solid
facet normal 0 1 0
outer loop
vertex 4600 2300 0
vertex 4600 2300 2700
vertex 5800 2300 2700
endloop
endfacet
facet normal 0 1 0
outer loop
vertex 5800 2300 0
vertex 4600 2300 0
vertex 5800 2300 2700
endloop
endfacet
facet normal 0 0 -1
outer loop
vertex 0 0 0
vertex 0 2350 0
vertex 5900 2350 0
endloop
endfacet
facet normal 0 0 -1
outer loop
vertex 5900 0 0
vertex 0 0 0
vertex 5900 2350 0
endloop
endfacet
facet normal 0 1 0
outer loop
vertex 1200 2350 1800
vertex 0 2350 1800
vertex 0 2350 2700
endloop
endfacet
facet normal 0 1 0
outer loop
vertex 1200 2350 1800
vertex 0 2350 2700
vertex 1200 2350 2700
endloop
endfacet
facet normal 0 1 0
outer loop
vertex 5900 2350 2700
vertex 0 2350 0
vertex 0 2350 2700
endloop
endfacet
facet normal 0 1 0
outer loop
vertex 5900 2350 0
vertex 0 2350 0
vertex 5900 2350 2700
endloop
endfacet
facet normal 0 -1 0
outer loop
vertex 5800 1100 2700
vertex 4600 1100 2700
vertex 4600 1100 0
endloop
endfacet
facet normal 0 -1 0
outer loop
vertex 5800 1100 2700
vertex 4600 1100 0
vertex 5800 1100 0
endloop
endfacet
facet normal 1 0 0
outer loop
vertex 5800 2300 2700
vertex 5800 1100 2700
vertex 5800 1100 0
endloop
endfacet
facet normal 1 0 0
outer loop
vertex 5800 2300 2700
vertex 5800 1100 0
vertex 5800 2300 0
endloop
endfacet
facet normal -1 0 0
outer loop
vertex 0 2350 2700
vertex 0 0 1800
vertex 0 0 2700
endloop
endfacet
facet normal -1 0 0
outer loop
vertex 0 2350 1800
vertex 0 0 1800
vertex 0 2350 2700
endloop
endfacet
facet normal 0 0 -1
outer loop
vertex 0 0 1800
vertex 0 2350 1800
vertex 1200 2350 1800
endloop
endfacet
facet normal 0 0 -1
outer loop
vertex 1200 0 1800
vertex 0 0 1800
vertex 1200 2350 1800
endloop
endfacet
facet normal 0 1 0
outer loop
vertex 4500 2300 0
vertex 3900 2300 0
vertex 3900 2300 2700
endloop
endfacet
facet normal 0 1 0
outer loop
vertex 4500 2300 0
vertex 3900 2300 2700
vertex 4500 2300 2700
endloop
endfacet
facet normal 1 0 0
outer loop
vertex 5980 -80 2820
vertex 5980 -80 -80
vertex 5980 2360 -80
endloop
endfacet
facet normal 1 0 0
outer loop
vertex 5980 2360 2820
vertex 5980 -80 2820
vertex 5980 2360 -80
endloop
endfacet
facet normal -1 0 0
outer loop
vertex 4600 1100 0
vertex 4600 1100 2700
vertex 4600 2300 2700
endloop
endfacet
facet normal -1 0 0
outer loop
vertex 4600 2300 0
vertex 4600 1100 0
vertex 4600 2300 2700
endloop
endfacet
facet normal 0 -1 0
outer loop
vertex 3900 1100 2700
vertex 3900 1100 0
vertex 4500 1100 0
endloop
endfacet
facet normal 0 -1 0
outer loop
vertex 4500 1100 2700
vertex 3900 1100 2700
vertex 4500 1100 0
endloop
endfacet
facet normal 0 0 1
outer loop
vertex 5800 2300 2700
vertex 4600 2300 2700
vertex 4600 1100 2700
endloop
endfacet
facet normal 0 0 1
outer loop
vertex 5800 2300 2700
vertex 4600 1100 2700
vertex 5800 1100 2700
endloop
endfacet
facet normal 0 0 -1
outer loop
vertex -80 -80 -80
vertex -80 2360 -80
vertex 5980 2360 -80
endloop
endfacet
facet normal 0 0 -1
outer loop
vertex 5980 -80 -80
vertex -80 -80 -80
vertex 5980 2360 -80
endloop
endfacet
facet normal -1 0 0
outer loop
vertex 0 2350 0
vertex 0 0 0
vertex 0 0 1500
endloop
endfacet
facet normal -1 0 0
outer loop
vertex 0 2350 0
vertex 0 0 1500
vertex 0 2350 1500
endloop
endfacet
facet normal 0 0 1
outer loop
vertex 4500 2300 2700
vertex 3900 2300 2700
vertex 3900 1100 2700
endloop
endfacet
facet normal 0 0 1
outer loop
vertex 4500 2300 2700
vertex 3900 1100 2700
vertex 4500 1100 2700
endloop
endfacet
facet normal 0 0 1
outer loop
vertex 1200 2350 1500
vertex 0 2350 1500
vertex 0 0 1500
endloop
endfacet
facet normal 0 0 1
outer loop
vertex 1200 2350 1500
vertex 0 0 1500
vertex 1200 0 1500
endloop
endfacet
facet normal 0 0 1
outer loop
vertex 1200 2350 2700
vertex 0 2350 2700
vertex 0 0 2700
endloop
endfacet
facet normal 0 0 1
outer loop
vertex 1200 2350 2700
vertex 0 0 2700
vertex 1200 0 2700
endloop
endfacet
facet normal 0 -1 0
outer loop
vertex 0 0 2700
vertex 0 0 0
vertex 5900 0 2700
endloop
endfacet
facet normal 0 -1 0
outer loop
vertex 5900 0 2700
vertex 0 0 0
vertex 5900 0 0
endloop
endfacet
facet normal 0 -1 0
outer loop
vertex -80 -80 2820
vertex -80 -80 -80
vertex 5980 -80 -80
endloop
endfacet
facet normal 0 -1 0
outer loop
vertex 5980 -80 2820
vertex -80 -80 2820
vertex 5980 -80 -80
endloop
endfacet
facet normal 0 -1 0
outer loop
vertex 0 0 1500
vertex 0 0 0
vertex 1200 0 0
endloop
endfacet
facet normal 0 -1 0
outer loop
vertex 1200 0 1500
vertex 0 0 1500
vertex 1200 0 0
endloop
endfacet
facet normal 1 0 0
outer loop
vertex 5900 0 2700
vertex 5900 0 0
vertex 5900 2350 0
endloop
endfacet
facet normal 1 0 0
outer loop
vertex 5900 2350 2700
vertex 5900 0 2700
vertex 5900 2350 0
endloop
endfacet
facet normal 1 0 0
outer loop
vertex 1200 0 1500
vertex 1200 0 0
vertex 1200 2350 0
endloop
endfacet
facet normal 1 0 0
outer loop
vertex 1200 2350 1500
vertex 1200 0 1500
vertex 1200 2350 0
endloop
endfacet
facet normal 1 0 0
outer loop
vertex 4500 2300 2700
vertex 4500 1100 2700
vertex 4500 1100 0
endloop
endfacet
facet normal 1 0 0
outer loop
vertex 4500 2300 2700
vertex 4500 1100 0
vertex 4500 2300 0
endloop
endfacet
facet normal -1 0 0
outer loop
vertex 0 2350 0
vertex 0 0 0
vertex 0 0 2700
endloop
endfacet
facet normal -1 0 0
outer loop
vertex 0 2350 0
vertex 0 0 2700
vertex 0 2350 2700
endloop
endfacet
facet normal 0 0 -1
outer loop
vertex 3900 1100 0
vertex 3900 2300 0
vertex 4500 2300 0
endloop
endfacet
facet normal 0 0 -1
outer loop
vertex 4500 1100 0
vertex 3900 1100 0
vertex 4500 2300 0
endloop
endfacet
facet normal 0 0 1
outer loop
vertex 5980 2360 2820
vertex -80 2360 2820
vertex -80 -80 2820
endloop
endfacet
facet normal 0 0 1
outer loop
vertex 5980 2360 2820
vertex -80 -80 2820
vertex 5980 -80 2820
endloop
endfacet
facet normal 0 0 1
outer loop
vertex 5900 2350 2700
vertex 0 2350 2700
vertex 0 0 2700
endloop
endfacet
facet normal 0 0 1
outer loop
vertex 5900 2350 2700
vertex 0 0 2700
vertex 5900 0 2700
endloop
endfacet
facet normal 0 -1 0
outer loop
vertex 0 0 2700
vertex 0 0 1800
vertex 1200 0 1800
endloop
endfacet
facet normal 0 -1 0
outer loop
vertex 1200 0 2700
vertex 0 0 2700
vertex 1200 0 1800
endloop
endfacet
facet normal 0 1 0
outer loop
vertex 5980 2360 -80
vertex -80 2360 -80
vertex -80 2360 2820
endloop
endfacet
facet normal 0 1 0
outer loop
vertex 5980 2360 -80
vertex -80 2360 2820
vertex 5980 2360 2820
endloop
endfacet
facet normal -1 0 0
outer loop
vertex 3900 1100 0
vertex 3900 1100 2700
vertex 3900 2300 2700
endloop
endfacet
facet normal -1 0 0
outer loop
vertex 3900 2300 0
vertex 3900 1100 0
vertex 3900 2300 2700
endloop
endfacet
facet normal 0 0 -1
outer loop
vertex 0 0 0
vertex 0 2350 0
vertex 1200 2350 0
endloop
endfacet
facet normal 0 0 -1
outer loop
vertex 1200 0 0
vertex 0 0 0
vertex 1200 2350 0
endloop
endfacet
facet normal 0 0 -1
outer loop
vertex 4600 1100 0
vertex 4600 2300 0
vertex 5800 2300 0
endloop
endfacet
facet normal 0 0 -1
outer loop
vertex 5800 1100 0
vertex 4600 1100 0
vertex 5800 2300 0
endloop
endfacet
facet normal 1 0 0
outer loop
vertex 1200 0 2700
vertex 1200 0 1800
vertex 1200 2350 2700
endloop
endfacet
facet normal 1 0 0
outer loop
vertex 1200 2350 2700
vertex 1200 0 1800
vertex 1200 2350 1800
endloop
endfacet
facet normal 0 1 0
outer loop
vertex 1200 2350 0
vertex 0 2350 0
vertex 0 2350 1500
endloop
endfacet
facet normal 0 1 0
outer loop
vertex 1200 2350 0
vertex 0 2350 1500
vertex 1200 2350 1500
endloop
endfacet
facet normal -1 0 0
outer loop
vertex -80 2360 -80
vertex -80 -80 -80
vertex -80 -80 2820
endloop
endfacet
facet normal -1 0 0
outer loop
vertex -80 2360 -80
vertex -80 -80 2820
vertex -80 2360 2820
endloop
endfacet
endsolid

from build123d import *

# Parameters (mm, degrees)
BOX_W        = 6060
BOX_H        = 2440
BOX_DEPTH    = 2900
BOX001_W     = 5900
BOX001_H     = 2350
BOX001_DEPTH = 2700
BOX002_W     = 1200
BOX002_H     = 2350
BOX002_DEPTH = 900
BOX003_W     = 1200
BOX003_H     = 2350
BOX003_DEPTH = 1500
BOX004_W     = 600
BOX004_H     = 1200
BOX004_DEPTH = 2700
BOX005_W     = 1200
BOX005_H     = 1200
BOX005_DEPTH = 2700


with BuildPart() as ref_20_hc_outer:
    # Box → Box (new body)
    with BuildSketch(Plane(origin=(-80, -80, -80), x_dir=(1, 0, 0), z_dir=(0, 0, 1))):
        with Locations((3030, 1220)):
            Rectangle(BOX_W, BOX_H)
    extrude(amount=BOX_DEPTH)


with BuildPart() as ref_20_fc_inner:
    # Box001 → Box001 (new body)
    with BuildSketch(Plane.XY):
        with Locations((2950, 1175)):
            Rectangle(BOX001_W, BOX001_H)
    extrude(amount=BOX001_DEPTH)


with BuildPart() as bed:
    # Box002 → Box002 (new body)
    with BuildSketch(Plane.XY.offset(1800)):
        with Locations((600, 1175)):
            Rectangle(BOX002_W, BOX002_H)
    extrude(amount=BOX002_DEPTH)


with BuildPart() as desk:
    # Box003 → Box003 (new body)
    with BuildSketch(Plane.XY):
        with Locations((600, 1175)):
            Rectangle(BOX003_W, BOX003_H)
    extrude(amount=BOX003_DEPTH)


with BuildPart() as kichenette:
    # Box004 → Box004 (new body)
    with BuildSketch(Plane(origin=(3900, 1100, 0), x_dir=(1, 0, 0), z_dir=(0, 0, 1))):
        with Locations((300, 600)):
            Rectangle(BOX004_W, BOX004_H)
    extrude(amount=BOX004_DEPTH)


with BuildPart() as bathroom:
    # Box005 → Box005 (new body)
    with BuildSketch(Plane(origin=(4600, 1100, 0), x_dir=(1, 0, 0), z_dir=(0, 0, 1))):
        with Locations((600, 600)):
            Rectangle(BOX005_W, BOX005_H)
    extrude(amount=BOX005_DEPTH)


solid = Compound([ref_20_hc_outer.part, ref_20_fc_inner.part, bed.part, desk.part, kichenette.part, bathroom.part])
